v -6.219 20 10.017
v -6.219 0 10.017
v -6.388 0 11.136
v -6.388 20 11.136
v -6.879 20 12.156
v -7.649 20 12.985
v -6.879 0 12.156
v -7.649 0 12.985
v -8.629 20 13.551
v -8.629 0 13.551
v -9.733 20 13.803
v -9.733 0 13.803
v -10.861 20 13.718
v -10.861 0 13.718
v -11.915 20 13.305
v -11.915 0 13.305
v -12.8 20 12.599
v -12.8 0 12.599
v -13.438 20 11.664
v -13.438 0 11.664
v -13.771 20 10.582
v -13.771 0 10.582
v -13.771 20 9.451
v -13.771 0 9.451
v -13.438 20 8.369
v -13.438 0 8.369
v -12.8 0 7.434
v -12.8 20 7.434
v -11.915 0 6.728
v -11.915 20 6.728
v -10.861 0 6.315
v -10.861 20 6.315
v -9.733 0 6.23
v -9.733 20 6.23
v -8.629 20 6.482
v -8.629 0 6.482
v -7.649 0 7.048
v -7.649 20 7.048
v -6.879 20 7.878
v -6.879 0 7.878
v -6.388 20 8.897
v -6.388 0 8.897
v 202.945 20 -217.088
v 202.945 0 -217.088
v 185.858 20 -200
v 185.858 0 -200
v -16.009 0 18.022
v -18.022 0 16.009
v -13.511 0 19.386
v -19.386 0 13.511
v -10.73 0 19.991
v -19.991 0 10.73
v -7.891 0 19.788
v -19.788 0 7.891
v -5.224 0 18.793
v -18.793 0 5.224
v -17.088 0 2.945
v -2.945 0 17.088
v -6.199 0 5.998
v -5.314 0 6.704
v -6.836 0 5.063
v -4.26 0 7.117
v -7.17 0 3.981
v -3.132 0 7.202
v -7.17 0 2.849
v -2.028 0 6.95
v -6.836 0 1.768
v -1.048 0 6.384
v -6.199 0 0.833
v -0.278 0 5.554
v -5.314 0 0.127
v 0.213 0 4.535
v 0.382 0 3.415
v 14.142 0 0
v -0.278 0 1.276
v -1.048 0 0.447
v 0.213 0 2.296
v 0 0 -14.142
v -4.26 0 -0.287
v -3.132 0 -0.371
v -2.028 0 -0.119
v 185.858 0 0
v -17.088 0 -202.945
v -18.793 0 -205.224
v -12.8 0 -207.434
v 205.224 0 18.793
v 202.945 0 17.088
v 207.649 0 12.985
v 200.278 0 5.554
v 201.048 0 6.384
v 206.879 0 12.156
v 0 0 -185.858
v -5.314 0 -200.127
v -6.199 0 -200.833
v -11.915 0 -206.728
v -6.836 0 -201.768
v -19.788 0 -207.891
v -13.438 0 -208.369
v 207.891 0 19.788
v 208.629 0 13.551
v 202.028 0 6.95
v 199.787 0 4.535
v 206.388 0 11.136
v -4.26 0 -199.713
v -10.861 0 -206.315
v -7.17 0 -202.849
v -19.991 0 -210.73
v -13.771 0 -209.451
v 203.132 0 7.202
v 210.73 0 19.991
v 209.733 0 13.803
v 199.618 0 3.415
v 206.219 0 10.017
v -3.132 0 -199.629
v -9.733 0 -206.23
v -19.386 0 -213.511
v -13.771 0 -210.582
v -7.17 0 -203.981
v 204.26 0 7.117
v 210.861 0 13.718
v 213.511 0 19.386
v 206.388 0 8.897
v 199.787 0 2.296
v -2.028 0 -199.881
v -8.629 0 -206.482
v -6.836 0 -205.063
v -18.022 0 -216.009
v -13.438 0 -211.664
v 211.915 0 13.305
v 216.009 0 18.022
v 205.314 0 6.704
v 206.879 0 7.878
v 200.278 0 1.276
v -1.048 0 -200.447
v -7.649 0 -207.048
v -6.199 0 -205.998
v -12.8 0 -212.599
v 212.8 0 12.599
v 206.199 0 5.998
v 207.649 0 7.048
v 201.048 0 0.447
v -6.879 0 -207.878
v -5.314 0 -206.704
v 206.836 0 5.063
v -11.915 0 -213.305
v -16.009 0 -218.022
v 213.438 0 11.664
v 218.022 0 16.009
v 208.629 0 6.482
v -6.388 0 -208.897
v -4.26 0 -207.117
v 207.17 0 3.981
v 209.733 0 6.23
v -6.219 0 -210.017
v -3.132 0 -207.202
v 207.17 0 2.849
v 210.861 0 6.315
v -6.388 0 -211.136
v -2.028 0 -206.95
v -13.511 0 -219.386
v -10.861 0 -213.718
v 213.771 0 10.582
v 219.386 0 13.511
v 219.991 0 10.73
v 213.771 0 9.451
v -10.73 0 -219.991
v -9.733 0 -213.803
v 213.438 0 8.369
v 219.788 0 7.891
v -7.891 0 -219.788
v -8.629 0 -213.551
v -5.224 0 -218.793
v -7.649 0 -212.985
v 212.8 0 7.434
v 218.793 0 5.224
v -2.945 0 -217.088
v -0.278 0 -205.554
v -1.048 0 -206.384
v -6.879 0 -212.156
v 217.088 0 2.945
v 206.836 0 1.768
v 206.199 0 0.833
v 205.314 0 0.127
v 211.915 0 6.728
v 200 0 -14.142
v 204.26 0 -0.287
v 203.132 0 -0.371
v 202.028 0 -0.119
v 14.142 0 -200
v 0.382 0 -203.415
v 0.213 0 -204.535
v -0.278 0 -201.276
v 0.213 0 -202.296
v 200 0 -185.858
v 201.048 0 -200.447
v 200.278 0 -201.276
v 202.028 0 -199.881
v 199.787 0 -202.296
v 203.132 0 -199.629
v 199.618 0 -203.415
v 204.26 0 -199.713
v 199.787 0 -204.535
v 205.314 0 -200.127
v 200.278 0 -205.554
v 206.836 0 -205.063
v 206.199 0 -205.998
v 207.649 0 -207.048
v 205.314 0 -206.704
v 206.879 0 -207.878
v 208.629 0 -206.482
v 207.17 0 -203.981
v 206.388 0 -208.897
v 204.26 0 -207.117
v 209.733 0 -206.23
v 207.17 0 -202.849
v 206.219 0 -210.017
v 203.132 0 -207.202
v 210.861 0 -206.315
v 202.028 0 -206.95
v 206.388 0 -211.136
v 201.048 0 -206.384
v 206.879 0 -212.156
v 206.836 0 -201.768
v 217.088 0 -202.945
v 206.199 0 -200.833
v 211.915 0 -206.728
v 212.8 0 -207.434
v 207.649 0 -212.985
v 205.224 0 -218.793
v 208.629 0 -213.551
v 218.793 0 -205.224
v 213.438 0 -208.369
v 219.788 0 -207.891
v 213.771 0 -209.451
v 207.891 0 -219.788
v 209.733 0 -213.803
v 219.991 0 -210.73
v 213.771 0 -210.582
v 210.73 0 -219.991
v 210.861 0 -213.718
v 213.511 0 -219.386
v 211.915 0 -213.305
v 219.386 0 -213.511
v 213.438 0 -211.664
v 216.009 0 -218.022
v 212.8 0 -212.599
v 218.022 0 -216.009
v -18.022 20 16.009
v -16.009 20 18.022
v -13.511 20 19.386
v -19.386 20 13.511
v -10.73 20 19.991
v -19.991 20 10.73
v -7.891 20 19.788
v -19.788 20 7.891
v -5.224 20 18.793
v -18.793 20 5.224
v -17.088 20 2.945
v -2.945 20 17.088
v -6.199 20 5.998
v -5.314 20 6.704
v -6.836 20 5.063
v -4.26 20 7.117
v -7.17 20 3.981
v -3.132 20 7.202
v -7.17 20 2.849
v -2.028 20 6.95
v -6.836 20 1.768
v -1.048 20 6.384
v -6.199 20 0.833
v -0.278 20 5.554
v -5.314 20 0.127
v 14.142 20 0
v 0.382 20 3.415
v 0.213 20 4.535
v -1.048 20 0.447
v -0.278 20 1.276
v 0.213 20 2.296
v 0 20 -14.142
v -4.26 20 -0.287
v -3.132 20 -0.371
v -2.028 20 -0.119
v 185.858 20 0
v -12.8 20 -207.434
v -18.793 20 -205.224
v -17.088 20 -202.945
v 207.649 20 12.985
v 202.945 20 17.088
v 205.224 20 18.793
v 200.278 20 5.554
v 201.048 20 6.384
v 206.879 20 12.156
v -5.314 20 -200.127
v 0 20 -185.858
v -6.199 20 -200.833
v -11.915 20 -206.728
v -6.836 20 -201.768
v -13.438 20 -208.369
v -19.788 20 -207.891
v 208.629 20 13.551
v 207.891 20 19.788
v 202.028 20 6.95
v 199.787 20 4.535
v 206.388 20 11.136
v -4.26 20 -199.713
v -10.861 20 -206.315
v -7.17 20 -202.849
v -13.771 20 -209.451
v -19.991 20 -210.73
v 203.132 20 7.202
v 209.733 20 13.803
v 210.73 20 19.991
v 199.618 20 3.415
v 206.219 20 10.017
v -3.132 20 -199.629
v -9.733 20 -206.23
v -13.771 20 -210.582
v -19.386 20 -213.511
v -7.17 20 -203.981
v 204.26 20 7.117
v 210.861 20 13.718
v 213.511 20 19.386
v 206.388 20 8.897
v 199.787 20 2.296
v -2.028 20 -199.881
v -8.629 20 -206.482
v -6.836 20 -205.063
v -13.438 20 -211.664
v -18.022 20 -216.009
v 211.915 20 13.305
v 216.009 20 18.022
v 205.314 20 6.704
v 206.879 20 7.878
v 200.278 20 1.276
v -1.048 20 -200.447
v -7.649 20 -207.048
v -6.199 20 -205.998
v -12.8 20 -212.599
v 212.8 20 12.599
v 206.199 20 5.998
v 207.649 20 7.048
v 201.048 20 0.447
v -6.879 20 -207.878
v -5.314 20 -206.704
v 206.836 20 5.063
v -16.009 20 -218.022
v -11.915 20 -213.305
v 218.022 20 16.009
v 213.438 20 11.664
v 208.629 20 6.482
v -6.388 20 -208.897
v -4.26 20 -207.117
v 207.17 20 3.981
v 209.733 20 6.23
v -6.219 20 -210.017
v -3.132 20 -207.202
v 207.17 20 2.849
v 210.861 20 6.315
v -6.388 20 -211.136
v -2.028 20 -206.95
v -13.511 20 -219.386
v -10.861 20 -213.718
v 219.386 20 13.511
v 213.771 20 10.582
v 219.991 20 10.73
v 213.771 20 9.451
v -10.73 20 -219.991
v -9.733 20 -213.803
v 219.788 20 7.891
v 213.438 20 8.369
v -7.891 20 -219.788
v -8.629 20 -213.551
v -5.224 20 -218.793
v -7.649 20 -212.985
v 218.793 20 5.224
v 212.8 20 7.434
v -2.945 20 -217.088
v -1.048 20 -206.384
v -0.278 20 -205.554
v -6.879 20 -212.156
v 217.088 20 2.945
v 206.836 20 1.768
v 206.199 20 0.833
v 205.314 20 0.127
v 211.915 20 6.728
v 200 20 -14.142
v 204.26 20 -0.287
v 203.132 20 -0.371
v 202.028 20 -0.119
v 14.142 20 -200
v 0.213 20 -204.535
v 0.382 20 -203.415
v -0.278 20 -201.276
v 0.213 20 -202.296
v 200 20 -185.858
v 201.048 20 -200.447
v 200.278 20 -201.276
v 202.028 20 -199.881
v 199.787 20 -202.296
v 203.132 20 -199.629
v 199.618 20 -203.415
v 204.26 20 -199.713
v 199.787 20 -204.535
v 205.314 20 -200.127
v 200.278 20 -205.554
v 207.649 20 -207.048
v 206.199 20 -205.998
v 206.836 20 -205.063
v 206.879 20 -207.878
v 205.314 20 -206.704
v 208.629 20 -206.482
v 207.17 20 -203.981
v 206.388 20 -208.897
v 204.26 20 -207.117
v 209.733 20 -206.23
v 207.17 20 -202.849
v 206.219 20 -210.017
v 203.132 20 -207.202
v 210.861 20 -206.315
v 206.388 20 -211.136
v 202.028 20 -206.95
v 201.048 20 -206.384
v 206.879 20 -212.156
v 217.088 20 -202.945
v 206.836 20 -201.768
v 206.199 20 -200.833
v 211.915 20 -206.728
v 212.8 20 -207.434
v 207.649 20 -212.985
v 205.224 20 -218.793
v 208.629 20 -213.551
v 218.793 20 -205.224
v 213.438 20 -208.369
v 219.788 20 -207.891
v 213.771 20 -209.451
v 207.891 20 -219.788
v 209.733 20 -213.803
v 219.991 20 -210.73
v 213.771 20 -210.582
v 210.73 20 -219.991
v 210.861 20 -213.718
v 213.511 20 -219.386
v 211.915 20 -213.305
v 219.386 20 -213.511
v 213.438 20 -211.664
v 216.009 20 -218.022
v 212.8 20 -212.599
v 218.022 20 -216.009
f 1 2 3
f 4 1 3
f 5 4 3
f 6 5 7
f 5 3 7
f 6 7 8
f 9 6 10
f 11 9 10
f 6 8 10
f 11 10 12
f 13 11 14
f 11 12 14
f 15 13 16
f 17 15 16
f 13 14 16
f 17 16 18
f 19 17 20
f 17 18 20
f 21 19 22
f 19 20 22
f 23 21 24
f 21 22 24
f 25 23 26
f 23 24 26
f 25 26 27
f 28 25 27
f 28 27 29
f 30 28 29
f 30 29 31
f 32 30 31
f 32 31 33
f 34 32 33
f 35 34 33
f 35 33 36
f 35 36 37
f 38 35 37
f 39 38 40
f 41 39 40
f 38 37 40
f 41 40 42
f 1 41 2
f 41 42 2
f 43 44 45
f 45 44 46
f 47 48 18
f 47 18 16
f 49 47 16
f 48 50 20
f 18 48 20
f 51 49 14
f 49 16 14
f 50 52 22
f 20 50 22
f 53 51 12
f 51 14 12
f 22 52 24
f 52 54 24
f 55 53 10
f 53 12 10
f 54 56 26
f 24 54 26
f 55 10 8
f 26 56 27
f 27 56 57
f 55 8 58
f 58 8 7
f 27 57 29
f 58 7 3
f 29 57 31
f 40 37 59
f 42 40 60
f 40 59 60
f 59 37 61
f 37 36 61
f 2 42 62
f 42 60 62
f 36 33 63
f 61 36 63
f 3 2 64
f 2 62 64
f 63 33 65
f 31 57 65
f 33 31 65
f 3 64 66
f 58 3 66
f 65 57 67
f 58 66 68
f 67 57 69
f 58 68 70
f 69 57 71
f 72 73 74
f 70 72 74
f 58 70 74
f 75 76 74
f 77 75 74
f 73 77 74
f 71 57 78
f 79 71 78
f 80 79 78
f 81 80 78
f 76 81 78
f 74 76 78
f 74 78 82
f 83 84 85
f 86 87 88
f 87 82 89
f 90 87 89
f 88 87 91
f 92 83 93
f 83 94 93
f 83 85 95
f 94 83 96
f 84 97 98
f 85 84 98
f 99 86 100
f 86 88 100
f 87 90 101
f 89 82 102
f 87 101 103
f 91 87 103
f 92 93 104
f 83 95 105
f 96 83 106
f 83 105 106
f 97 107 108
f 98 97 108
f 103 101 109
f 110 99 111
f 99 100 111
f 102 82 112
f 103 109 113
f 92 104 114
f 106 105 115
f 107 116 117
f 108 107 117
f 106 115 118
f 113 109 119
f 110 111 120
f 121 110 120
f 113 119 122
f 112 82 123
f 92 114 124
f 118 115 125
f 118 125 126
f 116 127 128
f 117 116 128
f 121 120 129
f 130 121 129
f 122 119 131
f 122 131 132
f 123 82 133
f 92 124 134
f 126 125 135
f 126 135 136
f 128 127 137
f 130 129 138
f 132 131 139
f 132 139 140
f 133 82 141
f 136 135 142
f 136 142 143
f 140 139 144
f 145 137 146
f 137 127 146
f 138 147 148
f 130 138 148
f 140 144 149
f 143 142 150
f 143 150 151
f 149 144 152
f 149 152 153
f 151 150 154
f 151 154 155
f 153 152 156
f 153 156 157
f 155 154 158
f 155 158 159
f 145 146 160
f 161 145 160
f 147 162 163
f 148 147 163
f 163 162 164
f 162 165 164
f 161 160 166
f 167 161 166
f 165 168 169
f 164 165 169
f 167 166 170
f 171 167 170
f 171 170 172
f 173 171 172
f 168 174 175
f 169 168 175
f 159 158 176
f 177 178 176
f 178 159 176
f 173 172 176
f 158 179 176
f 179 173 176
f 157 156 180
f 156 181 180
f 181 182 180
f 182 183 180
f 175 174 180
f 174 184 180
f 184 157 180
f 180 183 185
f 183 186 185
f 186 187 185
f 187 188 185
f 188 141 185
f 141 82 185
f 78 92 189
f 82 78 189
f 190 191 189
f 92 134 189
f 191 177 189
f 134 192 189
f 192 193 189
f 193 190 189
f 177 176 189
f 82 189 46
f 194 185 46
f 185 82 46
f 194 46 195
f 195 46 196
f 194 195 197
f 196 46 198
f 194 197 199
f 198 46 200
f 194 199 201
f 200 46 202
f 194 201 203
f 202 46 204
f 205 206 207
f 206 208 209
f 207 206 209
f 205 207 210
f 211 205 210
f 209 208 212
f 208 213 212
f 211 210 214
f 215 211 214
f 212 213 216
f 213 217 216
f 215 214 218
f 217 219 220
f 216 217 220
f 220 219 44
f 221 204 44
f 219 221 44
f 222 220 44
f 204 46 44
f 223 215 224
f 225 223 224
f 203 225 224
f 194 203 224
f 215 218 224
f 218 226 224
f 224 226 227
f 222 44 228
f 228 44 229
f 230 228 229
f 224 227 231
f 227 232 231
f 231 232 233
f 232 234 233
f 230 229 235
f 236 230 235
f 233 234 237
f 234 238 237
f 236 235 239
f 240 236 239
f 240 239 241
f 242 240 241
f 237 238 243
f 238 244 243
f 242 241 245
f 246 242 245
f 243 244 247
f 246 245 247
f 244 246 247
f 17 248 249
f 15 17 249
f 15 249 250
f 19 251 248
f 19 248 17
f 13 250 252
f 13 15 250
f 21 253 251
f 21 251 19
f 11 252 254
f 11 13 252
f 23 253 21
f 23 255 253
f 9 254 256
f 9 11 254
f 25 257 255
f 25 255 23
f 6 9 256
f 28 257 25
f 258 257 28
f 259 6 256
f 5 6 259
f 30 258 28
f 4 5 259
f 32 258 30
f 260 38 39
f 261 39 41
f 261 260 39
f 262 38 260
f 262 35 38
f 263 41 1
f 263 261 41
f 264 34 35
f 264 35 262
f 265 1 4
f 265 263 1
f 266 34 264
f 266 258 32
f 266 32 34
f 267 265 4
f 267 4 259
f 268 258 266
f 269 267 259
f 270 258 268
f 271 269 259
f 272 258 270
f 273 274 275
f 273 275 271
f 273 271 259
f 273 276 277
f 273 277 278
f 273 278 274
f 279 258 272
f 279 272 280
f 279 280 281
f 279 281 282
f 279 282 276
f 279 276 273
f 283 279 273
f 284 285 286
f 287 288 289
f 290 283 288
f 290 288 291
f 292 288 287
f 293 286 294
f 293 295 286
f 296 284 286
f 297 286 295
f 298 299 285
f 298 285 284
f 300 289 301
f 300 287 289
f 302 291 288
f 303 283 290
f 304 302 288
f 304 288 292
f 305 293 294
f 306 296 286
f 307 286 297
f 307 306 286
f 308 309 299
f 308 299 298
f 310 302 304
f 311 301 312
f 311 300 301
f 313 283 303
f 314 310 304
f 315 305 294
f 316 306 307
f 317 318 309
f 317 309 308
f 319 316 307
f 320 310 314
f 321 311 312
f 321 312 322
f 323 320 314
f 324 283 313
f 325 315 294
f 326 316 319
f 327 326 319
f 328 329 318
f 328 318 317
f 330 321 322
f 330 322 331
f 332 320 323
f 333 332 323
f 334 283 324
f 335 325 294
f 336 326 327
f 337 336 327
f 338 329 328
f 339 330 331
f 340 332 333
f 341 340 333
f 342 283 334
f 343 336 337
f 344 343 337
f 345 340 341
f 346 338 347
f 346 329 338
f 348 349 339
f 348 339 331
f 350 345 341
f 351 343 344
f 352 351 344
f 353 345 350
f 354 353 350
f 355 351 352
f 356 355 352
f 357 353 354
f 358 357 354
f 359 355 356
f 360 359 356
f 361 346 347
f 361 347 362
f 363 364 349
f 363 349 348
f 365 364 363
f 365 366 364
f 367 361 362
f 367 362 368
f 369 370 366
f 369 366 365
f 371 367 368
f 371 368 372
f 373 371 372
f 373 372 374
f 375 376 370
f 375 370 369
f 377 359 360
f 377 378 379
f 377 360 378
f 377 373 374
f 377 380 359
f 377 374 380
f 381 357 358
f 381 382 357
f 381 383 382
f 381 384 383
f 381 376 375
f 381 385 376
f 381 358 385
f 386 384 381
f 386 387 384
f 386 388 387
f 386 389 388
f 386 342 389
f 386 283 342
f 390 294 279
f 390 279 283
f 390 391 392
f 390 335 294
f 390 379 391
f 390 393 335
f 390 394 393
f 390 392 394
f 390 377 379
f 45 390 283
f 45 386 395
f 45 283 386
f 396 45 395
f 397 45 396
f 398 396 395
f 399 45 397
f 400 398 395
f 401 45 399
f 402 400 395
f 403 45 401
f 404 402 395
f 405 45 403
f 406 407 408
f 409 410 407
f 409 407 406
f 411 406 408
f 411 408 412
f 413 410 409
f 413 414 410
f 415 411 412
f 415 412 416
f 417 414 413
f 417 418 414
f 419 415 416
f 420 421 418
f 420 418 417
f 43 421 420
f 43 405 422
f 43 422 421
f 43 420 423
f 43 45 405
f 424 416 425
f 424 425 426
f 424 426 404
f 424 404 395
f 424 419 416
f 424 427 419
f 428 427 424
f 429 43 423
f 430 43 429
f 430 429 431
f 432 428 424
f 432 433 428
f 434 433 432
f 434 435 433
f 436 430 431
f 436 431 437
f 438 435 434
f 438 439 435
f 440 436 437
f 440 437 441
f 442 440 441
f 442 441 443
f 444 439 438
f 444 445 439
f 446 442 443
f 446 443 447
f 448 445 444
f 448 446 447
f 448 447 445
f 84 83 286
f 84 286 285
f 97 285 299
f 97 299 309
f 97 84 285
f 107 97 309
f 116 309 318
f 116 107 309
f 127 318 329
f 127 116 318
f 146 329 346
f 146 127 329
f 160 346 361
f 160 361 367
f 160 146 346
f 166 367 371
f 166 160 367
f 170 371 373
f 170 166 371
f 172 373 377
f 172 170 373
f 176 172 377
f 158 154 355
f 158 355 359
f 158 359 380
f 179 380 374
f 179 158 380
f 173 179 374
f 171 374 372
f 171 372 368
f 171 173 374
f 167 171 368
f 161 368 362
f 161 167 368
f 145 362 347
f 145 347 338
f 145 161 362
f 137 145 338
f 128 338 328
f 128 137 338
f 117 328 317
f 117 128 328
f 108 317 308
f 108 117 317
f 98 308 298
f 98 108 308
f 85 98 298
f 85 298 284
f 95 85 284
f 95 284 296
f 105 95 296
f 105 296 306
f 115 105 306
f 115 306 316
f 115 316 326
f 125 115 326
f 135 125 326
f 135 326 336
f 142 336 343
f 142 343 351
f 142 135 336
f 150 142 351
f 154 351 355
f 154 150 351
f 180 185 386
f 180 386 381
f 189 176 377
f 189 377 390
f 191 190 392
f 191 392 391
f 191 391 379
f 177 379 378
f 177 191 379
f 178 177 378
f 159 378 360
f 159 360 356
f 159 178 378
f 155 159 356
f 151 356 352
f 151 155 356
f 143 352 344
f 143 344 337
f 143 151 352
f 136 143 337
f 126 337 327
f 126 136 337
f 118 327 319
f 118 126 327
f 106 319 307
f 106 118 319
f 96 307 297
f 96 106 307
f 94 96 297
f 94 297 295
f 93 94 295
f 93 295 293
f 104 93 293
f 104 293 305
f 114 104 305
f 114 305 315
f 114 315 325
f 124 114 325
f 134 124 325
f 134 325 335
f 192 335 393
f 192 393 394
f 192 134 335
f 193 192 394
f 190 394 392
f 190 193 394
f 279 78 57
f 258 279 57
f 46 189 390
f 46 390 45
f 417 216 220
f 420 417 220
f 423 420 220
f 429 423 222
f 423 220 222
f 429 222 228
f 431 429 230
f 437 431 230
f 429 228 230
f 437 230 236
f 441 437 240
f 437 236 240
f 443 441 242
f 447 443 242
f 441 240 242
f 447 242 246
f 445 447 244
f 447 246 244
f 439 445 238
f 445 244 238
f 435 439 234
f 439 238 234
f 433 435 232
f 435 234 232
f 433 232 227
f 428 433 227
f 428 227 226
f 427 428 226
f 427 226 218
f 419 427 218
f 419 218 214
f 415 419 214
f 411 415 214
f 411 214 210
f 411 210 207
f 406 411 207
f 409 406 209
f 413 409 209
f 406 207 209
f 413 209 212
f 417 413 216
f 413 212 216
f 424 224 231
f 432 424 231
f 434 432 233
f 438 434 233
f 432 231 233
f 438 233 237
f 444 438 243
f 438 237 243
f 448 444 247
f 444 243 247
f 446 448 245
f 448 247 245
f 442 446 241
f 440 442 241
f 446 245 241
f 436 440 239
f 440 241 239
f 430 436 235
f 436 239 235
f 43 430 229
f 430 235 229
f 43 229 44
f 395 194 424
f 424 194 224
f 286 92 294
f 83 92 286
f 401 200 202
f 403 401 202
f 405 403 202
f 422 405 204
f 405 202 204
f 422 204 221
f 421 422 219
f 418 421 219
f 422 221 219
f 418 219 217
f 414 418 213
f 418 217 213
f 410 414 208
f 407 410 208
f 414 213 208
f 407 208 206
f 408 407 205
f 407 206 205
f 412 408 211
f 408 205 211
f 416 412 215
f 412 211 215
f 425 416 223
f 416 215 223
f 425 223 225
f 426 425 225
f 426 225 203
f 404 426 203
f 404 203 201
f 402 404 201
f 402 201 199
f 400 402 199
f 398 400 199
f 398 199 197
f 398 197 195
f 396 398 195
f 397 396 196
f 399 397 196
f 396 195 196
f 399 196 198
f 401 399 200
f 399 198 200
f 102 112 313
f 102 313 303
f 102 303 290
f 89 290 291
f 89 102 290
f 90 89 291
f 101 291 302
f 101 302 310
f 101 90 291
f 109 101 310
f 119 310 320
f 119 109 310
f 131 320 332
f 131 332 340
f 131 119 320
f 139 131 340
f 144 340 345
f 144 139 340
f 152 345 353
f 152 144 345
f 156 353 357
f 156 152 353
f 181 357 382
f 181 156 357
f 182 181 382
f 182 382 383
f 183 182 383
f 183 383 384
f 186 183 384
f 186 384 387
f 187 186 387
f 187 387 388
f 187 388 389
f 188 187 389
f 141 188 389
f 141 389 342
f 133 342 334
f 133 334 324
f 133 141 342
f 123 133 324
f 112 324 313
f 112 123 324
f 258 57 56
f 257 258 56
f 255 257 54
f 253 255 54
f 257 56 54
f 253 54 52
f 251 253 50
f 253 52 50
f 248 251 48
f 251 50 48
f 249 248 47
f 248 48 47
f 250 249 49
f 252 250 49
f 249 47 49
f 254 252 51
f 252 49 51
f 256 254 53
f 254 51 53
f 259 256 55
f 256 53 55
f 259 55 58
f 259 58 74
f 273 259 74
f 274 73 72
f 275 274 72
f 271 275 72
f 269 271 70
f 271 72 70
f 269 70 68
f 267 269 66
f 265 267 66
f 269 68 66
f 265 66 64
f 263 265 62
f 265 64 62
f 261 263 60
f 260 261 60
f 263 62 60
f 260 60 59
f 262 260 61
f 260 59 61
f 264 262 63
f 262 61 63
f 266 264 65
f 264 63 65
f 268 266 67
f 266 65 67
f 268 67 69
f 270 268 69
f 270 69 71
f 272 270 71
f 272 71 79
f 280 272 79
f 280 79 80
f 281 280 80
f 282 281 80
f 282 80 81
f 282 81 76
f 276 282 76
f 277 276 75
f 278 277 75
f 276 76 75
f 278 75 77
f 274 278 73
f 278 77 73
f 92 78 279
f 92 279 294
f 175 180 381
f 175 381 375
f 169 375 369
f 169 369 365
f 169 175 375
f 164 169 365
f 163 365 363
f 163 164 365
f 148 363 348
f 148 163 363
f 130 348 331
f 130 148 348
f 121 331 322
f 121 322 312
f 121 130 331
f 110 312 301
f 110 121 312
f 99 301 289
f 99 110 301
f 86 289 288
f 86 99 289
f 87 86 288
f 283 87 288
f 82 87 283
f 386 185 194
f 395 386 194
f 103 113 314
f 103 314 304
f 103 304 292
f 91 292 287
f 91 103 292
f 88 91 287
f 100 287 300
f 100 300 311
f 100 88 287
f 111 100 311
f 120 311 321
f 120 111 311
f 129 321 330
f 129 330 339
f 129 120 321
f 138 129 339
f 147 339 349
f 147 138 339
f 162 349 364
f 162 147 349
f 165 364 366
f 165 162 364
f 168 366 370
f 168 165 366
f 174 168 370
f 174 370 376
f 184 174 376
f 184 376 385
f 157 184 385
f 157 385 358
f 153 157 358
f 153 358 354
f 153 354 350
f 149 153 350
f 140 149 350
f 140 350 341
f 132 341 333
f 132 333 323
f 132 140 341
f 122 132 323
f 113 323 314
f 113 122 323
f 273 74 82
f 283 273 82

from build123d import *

# Parameters (mm, degrees)
SKETCH1_W               = 200
SKETCH1_H               = 200
BOSS_EXTRUDE1_DEPTH     = 20
SKETCH2_R               = 3.7970867
BOSS_EXTRUDE2_DEPTH     = 20
MIRROR4_COPY_1_SKETCH_R = 3.7970867
MIRROR4_COPY_1_DEPTH    = 20


with BuildPart() as part:
    # Sketch1 → Boss-Extrude1 (new body)
    with BuildSketch(Plane(origin=(0, 0, 0), x_dir=(1, 0, 0), z_dir=(0, 1, 0))):
        with Locations((100, 100)):
            Rectangle(SKETCH1_W, SKETCH1_H)
    extrude(amount=BOSS_EXTRUDE1_DEPTH)

    # Sketch2 → Boss-Extrude2 (add)
    with BuildSketch(Plane.XZ):
        with BuildLine():
            Line((0, -14.142135624), (-17.087625271, 2.945489647))
            ThreePointArc((-17.087625271, 2.945489647), (-17.087625271, 17.087625271), (-2.945489647, 17.087625271))
            Line((-2.945489647, 17.087625271), (14.142135624, 0))
            Line((14.142135624, 0), (0, 0))
            Line((0, 0), (0, -14.142135624))
        make_face()
        with Locations((-10.016557459, 10.016557459)):
            Circle(SKETCH2_R, mode=Mode.SUBTRACT)
        with Locations((-3.415367361, 3.415367361)):
            Circle(SKETCH2_R, mode=Mode.SUBTRACT)
    boss_extrude2 = extrude(amount=-BOSS_EXTRUDE2_DEPTH)

    # Mirror3: Boss-Extrude2 across plane
    add(boss_extrude2.mirror(Plane(origin=(100, 0, 0), x_dir=(0, 0, 1), z_dir=(1, 0, 0))))

    # Mirror4: Boss-Extrude2 across plane
    add(boss_extrude2.mirror(Plane(origin=(0, 0, -100), x_dir=(1, 0, 0), z_dir=(0, 0, -1))))

    # Mirror4 copy 1 sketch → Mirror4 copy 1 (add)
    with BuildSketch(Plane(origin=(200, 0, -200), x_dir=(-1, 0, 0), z_dir=(0, -1, 0))):
        with BuildLine():
            Line((0, -14.142135624), (-17.087625271, 2.945489647))
            ThreePointArc((-17.087625271, 2.945489647), (-17.087625271, 17.087625271), (-2.945489647, 17.087625271))
            Line((-2.945489647, 17.087625271), (14.142135624, 0))
            Line((14.142135624, 0), (0, 0))
            Line((0, 0), (0, -14.142135624))
        make_face()
        with Locations((-10.016557459, 10.016557459)):
            Circle(MIRROR4_COPY_1_SKETCH_R, mode=Mode.SUBTRACT)
        with Locations((-3.415367361, 3.415367361)):
            Circle(MIRROR4_COPY_1_SKETCH_R, mode=Mode.SUBTRACT)
    extrude(amount=-MIRROR4_COPY_1_DEPTH)


solid = part.part
